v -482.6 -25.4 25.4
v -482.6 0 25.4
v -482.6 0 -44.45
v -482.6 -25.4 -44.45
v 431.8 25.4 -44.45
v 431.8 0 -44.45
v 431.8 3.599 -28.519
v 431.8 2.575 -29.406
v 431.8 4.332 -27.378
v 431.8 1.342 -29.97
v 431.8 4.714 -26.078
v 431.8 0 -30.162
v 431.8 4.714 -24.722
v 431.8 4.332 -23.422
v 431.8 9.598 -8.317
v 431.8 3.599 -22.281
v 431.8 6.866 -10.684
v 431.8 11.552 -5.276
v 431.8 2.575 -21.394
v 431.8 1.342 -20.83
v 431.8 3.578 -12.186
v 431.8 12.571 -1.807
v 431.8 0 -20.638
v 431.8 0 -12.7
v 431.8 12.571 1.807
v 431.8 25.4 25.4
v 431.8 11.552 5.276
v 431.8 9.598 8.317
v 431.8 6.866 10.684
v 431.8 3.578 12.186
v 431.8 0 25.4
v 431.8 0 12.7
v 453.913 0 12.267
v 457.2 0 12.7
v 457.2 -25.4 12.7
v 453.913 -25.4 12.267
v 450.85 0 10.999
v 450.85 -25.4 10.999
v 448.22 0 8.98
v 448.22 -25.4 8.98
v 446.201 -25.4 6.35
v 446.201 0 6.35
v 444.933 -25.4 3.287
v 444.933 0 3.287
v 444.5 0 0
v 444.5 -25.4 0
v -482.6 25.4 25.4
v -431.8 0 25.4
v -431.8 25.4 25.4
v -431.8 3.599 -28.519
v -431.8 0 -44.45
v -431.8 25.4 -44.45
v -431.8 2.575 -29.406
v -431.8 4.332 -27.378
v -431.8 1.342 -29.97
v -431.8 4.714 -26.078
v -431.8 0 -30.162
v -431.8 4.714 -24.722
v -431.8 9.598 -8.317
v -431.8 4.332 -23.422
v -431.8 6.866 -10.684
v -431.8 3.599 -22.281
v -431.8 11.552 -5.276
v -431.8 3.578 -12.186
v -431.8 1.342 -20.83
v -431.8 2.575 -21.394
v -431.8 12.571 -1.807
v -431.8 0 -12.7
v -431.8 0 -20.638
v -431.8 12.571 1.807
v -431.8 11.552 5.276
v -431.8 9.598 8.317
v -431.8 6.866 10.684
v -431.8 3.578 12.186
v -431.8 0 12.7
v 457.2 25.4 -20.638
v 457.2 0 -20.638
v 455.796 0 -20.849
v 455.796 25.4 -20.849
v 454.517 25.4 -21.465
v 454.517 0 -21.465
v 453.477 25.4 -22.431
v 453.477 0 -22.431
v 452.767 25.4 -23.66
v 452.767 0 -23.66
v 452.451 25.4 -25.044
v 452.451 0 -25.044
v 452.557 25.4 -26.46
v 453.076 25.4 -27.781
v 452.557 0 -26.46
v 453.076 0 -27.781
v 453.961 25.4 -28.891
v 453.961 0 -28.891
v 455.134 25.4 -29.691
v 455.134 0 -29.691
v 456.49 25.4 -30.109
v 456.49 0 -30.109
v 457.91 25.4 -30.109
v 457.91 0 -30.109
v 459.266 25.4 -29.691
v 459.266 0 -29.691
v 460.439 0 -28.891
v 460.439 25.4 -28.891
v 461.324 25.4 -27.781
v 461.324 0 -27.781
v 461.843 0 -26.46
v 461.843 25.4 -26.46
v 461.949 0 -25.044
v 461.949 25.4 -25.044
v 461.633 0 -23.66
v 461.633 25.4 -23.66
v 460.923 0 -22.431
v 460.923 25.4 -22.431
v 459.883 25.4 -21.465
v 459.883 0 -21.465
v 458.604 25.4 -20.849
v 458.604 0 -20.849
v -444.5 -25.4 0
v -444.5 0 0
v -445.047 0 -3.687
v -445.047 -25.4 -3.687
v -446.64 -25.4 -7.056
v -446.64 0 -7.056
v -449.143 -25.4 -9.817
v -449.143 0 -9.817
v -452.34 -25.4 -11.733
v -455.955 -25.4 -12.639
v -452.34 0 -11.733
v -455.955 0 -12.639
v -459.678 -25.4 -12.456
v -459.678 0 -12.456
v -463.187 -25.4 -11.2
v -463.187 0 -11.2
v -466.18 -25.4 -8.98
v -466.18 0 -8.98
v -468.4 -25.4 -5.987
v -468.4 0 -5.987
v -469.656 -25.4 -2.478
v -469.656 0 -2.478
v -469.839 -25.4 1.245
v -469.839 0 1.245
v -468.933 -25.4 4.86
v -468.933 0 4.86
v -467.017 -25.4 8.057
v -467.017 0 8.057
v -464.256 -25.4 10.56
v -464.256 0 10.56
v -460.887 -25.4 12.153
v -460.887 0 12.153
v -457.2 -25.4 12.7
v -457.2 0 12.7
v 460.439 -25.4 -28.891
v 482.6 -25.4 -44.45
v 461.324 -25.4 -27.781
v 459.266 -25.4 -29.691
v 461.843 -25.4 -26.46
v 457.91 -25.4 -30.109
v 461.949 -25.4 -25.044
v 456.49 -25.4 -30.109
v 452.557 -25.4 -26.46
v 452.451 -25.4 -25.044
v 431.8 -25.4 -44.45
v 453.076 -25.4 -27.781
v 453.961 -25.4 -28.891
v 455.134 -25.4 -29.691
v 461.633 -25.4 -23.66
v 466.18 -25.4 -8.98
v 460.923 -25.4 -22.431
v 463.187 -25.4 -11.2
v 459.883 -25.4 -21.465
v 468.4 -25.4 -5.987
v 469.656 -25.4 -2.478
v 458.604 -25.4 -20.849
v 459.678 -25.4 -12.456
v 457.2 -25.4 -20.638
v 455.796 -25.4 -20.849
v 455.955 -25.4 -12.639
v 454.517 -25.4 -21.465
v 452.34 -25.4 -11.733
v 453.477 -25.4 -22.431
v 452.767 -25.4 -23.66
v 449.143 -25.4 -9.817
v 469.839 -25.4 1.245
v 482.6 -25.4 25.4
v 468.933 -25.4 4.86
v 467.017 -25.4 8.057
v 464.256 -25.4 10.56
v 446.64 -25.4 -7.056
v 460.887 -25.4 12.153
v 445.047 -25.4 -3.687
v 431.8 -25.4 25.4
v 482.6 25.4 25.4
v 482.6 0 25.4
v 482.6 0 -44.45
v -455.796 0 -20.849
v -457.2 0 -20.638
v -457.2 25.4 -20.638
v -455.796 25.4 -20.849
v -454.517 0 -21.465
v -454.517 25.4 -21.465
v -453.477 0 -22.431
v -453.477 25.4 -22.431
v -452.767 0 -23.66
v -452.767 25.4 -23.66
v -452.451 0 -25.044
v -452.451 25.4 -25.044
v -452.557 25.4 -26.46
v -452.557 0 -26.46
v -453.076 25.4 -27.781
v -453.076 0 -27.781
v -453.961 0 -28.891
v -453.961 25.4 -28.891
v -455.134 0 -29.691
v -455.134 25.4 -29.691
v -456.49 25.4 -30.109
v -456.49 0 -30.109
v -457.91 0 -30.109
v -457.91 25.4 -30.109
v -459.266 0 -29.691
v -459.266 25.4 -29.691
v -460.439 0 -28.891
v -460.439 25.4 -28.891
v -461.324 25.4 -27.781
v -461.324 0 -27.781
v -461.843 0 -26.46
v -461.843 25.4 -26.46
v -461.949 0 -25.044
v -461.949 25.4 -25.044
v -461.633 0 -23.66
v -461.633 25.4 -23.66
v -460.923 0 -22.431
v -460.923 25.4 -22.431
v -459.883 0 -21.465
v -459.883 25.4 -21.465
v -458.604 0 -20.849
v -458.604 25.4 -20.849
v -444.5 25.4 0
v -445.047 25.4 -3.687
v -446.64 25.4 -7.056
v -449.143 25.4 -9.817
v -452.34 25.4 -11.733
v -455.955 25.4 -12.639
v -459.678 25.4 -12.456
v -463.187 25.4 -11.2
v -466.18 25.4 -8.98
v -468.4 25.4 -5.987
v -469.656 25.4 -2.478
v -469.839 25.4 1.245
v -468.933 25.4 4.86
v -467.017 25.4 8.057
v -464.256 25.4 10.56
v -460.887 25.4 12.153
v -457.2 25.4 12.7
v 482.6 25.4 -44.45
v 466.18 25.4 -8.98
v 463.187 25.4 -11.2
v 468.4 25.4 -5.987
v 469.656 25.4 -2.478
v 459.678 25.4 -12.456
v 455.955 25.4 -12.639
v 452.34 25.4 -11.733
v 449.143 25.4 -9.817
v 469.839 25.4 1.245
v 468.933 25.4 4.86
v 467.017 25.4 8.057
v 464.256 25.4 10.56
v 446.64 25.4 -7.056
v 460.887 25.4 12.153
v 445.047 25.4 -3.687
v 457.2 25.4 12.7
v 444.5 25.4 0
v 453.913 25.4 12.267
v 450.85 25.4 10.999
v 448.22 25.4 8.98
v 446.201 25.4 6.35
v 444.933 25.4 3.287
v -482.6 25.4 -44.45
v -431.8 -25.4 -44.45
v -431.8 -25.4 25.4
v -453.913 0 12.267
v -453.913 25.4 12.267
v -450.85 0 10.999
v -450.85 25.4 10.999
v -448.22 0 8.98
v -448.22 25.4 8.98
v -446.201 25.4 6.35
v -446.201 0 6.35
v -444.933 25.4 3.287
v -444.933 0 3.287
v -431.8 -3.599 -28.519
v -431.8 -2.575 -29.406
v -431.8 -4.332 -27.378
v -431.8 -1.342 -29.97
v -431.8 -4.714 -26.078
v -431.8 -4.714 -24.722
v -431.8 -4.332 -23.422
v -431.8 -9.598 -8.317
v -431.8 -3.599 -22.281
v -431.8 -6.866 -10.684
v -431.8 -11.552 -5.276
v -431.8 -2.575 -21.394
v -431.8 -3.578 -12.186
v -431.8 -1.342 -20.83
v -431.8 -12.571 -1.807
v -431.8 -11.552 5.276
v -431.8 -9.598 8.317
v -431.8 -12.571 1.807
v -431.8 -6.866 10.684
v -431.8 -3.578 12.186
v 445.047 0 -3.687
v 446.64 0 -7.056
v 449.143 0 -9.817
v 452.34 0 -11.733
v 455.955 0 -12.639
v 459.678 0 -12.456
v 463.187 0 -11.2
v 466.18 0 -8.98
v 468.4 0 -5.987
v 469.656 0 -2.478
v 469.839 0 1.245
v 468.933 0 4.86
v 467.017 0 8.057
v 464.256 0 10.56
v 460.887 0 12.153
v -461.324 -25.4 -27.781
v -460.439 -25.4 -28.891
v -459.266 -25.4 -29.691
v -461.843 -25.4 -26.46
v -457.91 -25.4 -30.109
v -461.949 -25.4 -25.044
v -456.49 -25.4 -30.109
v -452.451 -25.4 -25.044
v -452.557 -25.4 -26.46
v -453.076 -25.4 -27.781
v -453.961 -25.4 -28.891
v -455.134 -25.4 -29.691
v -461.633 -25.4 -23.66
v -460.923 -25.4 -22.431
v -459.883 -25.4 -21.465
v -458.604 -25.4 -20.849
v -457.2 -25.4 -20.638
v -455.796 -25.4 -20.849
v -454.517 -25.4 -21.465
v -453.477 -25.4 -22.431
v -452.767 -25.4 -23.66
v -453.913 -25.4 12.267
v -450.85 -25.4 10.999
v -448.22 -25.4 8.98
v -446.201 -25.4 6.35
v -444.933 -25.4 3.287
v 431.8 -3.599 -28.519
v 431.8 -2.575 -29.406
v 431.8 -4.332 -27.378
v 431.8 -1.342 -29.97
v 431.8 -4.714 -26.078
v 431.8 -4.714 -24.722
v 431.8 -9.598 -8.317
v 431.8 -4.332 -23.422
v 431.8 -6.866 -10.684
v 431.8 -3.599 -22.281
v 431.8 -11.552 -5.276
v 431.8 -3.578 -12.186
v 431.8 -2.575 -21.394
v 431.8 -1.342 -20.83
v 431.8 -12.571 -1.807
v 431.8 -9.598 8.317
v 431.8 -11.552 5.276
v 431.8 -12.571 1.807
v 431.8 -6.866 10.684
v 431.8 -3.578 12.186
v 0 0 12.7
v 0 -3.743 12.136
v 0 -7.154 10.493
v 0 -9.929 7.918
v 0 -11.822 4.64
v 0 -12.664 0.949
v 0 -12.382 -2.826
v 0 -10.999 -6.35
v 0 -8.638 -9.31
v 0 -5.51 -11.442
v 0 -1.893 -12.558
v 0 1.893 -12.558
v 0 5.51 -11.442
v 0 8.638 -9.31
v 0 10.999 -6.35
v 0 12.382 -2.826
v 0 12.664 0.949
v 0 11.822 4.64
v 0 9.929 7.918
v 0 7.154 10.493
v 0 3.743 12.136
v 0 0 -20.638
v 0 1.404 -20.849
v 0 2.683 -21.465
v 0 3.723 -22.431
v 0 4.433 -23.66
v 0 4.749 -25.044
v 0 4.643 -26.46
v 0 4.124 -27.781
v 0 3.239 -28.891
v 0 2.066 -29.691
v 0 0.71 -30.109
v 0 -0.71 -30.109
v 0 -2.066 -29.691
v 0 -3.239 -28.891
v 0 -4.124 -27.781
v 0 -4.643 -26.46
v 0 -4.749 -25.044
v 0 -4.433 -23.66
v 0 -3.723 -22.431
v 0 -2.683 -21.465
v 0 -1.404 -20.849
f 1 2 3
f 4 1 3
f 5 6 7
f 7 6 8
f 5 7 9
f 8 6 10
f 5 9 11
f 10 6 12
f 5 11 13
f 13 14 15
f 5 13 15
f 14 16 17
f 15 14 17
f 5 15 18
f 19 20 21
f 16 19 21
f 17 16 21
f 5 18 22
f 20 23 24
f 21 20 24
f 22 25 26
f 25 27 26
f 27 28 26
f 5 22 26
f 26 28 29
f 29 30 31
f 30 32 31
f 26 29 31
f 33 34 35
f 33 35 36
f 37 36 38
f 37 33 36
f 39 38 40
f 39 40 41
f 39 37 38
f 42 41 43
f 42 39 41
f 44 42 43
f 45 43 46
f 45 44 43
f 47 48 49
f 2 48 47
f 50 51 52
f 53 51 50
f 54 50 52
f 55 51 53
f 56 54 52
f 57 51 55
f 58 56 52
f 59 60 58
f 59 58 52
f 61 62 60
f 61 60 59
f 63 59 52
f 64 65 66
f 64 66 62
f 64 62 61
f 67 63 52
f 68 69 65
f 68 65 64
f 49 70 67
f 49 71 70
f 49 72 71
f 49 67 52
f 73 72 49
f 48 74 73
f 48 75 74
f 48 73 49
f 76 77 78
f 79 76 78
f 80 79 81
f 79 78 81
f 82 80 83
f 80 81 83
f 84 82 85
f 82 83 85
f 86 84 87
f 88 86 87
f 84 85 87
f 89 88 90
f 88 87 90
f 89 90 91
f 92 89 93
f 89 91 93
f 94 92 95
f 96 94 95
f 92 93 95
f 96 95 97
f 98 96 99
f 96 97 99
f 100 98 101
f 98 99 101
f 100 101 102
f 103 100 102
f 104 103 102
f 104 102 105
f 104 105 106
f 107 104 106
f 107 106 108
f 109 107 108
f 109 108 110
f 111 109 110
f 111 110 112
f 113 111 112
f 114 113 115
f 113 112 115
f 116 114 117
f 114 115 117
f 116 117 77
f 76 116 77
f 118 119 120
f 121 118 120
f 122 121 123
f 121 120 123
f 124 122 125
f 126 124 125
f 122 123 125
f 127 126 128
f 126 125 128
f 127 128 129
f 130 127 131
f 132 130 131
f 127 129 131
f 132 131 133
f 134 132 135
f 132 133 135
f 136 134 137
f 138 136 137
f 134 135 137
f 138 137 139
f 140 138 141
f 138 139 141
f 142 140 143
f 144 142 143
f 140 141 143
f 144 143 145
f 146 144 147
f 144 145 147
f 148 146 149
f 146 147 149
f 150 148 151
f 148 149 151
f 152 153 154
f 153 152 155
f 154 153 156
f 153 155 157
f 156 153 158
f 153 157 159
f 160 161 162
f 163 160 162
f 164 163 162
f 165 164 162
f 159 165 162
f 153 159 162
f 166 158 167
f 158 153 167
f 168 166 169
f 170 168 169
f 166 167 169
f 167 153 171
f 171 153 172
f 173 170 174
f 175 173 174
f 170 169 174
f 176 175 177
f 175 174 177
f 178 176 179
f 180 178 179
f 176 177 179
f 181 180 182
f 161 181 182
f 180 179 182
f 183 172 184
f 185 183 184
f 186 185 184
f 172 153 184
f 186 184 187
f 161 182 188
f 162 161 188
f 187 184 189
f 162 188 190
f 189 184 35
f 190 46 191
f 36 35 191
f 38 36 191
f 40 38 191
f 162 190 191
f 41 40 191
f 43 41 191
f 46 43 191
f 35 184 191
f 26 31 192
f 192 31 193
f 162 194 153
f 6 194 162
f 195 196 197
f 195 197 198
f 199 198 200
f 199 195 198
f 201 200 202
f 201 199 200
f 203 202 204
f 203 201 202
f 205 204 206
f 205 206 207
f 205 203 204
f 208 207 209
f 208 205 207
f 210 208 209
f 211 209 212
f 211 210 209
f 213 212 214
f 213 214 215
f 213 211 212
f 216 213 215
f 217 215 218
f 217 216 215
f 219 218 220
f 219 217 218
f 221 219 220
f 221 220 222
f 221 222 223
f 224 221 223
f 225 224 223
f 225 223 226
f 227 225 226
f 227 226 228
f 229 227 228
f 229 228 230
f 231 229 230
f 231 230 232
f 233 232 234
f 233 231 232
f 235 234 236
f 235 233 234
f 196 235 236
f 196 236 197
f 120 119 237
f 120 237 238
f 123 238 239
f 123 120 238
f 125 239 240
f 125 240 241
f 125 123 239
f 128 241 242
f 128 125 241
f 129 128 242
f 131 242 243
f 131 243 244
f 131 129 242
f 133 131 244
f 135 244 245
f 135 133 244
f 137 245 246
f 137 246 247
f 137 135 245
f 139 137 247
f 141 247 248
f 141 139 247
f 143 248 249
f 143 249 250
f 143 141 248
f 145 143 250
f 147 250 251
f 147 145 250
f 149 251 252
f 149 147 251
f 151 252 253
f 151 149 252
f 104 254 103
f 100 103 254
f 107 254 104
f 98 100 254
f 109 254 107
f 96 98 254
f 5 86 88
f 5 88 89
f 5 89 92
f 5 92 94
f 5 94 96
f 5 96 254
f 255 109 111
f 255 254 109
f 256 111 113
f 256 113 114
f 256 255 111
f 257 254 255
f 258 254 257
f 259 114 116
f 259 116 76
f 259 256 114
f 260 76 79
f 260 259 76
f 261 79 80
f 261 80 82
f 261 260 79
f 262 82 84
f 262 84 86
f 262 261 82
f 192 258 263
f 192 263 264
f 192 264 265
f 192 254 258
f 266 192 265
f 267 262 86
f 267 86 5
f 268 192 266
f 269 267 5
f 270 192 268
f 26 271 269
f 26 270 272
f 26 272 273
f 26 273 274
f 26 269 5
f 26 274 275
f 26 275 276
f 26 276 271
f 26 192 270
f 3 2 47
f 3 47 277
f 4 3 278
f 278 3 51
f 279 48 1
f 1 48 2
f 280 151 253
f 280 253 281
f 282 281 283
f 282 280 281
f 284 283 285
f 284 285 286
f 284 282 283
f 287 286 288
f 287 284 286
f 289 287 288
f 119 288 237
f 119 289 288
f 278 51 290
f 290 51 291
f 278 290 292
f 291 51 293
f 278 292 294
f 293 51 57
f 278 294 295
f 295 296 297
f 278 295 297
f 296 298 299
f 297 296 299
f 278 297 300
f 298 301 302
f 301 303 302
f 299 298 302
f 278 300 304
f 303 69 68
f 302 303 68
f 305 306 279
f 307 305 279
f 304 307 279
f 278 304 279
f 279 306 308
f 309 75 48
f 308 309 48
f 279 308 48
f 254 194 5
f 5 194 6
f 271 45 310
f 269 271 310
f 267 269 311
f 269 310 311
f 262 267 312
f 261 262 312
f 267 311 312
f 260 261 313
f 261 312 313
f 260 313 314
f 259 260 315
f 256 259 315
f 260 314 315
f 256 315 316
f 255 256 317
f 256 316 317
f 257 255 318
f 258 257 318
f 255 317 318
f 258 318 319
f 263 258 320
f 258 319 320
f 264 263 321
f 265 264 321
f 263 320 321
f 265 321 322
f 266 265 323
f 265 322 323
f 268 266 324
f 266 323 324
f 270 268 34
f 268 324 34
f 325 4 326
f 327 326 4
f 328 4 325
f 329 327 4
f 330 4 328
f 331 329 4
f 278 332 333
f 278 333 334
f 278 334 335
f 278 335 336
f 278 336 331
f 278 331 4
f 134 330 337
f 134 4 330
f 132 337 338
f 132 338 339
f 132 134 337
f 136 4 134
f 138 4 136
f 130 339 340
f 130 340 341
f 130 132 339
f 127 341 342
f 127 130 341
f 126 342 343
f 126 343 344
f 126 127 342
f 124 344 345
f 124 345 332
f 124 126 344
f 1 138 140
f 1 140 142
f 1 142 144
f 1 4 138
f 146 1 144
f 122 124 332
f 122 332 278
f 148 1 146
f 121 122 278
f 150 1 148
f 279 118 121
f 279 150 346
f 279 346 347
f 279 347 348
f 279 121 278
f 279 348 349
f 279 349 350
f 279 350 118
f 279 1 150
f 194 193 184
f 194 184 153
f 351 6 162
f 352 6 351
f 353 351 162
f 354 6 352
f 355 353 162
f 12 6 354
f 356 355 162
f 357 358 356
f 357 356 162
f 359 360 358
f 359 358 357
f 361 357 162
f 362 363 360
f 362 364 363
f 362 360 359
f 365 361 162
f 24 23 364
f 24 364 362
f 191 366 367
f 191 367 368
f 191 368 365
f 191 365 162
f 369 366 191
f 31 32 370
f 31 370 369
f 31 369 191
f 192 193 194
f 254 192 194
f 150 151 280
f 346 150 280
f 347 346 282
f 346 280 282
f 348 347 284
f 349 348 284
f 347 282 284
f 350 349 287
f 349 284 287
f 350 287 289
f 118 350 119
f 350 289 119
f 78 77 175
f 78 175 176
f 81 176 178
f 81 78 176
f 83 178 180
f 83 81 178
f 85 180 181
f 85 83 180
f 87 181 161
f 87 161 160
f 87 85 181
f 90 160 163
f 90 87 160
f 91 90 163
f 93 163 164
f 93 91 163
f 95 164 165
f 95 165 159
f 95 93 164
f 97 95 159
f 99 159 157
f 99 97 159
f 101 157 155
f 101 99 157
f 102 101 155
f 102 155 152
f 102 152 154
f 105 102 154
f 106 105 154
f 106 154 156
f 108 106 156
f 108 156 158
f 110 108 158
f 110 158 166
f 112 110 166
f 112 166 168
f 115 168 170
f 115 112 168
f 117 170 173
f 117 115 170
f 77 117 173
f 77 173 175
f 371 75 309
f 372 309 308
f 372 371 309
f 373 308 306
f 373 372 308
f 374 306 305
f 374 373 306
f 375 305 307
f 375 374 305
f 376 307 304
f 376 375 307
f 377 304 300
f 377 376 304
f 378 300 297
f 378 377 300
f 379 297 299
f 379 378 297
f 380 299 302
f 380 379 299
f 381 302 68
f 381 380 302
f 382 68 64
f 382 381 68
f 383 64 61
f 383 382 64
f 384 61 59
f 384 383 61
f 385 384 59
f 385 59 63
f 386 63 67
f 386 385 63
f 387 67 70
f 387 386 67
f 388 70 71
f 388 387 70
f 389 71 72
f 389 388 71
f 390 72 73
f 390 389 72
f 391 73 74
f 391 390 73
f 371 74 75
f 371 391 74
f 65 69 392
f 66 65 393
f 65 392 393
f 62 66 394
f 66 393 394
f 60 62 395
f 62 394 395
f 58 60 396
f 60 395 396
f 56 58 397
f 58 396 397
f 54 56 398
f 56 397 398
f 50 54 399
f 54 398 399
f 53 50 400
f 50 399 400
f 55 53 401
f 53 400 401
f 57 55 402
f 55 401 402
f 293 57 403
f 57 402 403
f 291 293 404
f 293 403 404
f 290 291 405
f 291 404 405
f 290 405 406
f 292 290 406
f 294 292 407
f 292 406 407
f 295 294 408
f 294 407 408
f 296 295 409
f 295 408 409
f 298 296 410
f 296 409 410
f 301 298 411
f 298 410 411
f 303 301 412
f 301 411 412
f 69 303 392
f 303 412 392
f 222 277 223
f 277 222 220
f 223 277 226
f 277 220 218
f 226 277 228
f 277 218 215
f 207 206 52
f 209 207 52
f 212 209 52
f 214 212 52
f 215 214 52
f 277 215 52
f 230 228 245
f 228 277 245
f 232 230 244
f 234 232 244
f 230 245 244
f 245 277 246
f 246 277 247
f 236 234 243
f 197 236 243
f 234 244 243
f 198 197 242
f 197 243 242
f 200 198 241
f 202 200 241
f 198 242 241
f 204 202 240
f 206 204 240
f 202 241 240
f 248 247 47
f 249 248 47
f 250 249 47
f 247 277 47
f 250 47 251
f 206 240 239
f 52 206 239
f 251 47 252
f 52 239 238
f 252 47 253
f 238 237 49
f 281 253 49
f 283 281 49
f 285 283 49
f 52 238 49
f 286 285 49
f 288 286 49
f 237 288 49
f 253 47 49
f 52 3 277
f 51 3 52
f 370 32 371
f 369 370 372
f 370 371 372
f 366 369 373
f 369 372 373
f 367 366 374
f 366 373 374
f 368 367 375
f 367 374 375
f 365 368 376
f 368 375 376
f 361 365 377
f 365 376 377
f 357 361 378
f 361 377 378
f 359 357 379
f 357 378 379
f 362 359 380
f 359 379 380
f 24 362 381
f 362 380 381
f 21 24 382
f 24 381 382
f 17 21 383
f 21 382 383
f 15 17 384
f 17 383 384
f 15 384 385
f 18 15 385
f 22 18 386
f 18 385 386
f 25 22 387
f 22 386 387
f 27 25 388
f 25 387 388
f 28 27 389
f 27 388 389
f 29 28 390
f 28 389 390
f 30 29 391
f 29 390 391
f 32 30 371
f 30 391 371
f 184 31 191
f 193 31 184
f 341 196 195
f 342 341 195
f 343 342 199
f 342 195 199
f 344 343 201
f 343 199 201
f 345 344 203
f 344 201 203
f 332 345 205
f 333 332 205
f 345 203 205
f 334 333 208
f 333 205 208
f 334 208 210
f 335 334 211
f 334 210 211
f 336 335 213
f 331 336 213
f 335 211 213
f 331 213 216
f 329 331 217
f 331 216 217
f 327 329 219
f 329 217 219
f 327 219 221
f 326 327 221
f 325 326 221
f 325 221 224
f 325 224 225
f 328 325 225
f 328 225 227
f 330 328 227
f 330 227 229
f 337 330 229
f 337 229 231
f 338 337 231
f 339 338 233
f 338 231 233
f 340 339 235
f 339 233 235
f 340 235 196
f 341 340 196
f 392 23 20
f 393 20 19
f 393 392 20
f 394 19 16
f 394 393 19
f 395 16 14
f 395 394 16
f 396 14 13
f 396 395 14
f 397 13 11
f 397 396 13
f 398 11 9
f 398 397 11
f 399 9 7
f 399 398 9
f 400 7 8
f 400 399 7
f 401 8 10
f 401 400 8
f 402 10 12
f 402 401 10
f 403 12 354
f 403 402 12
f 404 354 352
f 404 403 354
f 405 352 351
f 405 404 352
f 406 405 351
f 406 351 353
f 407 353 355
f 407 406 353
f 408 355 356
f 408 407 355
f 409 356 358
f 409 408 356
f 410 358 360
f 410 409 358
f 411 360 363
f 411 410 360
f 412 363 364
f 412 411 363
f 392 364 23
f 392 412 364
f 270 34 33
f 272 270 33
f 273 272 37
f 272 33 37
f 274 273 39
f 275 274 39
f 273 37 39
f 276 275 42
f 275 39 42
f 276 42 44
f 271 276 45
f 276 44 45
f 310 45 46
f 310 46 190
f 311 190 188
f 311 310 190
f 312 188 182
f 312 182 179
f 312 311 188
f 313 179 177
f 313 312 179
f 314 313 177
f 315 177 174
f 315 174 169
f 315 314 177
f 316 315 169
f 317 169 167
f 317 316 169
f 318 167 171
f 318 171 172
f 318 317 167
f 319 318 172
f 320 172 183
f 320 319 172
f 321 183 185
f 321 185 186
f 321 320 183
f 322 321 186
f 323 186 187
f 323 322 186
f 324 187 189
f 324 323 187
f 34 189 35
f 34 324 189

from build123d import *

# Parameters (mm, degrees)
F0_W     = 431.8
F0_H     = 12.7
F0_H_2   = 4.7625
F3_DEPTH = 25.4


with BuildPart() as f1:
    # F0 (on Front) → F1 (revolve)
    with BuildSketch(Plane.XZ):
        with Locations((-215.9, 6.35)):
            Rectangle(F0_W, F0_H)
    revolve(axis=Axis((-228.6, 0, 0), (1, 0, 0)))



with BuildPart() as f2:
    # F0 (on Front) → F2 (revolve)
    with BuildSketch(Plane.XZ):
        with Locations((-215.9, -23.01875)):
            Rectangle(F0_W, F0_H_2)
    revolve(axis=Axis((-228.6, 0, -25.4), (-1, 0, 0)))


with BuildPart() as f1_1:
    add(f1.part)

    add(f2.part)  # F3 merges F2
    # F0 (on Front) → F3 (join, symmetric)
    with BuildSketch(Plane.XZ):
        with BuildLine():
            Line((-431.8, 0), (-444.5, 0))
            ThreePointArc((-444.5, 0), (-466.1802561211, -8.9802561211), (-457.2, 12.7))
            Line((-457.2, 12.7), (-431.8, 12.7))
            Line((-431.8, 12.7), (-431.8, 25.4))
            Line((-431.8, 25.4), (-482.6, 25.4))
            Line((-482.6, 25.4), (-482.6, -44.45))
            Line((-482.6, -44.45), (-431.8, -44.45))
            Line((-431.8, -44.45), (-431.8, -25.4))
            Line((-431.8, -25.4), (-452.4375, -25.4))
            ThreePointArc((-452.4375, -25.4), (-460.5675960454, -28.7675960454), (-457.2, -20.6375))
            Line((-457.2, -20.6375), (-431.8, -20.6375))
            Line((-431.8, -20.6375), (-431.8, 0))
        make_face()
        with BuildLine():
            ThreePointArc((-457.2, 12.7), (-448.2197438789, 8.9802561211), (-444.5, 0))
            Line((-444.5, 0), (-431.8, 0))
            Line((-431.8, 0), (-431.8, 12.7))
            Line((-431.8, 12.7), (-457.2, 12.7))
        make_face()
        with BuildLine():
            Line((-431.8, -25.4), (-431.8, -20.6375))
            Line((-431.8, -20.6375), (-457.2, -20.6375))
            ThreePointArc((-457.2, -20.6375), (-453.8324039546, -22.0324039546), (-452.4375, -25.4))
            Line((-452.4375, -25.4), (-431.8, -25.4))
        make_face()
    extrude(amount=F3_DEPTH, both=True)

    # F4: F1 across plane


with BuildPart() as f1_2:
    add(f1_1.part)
    add(f1_1.part.mirror(Plane.YZ))


solid = f1_2.part
